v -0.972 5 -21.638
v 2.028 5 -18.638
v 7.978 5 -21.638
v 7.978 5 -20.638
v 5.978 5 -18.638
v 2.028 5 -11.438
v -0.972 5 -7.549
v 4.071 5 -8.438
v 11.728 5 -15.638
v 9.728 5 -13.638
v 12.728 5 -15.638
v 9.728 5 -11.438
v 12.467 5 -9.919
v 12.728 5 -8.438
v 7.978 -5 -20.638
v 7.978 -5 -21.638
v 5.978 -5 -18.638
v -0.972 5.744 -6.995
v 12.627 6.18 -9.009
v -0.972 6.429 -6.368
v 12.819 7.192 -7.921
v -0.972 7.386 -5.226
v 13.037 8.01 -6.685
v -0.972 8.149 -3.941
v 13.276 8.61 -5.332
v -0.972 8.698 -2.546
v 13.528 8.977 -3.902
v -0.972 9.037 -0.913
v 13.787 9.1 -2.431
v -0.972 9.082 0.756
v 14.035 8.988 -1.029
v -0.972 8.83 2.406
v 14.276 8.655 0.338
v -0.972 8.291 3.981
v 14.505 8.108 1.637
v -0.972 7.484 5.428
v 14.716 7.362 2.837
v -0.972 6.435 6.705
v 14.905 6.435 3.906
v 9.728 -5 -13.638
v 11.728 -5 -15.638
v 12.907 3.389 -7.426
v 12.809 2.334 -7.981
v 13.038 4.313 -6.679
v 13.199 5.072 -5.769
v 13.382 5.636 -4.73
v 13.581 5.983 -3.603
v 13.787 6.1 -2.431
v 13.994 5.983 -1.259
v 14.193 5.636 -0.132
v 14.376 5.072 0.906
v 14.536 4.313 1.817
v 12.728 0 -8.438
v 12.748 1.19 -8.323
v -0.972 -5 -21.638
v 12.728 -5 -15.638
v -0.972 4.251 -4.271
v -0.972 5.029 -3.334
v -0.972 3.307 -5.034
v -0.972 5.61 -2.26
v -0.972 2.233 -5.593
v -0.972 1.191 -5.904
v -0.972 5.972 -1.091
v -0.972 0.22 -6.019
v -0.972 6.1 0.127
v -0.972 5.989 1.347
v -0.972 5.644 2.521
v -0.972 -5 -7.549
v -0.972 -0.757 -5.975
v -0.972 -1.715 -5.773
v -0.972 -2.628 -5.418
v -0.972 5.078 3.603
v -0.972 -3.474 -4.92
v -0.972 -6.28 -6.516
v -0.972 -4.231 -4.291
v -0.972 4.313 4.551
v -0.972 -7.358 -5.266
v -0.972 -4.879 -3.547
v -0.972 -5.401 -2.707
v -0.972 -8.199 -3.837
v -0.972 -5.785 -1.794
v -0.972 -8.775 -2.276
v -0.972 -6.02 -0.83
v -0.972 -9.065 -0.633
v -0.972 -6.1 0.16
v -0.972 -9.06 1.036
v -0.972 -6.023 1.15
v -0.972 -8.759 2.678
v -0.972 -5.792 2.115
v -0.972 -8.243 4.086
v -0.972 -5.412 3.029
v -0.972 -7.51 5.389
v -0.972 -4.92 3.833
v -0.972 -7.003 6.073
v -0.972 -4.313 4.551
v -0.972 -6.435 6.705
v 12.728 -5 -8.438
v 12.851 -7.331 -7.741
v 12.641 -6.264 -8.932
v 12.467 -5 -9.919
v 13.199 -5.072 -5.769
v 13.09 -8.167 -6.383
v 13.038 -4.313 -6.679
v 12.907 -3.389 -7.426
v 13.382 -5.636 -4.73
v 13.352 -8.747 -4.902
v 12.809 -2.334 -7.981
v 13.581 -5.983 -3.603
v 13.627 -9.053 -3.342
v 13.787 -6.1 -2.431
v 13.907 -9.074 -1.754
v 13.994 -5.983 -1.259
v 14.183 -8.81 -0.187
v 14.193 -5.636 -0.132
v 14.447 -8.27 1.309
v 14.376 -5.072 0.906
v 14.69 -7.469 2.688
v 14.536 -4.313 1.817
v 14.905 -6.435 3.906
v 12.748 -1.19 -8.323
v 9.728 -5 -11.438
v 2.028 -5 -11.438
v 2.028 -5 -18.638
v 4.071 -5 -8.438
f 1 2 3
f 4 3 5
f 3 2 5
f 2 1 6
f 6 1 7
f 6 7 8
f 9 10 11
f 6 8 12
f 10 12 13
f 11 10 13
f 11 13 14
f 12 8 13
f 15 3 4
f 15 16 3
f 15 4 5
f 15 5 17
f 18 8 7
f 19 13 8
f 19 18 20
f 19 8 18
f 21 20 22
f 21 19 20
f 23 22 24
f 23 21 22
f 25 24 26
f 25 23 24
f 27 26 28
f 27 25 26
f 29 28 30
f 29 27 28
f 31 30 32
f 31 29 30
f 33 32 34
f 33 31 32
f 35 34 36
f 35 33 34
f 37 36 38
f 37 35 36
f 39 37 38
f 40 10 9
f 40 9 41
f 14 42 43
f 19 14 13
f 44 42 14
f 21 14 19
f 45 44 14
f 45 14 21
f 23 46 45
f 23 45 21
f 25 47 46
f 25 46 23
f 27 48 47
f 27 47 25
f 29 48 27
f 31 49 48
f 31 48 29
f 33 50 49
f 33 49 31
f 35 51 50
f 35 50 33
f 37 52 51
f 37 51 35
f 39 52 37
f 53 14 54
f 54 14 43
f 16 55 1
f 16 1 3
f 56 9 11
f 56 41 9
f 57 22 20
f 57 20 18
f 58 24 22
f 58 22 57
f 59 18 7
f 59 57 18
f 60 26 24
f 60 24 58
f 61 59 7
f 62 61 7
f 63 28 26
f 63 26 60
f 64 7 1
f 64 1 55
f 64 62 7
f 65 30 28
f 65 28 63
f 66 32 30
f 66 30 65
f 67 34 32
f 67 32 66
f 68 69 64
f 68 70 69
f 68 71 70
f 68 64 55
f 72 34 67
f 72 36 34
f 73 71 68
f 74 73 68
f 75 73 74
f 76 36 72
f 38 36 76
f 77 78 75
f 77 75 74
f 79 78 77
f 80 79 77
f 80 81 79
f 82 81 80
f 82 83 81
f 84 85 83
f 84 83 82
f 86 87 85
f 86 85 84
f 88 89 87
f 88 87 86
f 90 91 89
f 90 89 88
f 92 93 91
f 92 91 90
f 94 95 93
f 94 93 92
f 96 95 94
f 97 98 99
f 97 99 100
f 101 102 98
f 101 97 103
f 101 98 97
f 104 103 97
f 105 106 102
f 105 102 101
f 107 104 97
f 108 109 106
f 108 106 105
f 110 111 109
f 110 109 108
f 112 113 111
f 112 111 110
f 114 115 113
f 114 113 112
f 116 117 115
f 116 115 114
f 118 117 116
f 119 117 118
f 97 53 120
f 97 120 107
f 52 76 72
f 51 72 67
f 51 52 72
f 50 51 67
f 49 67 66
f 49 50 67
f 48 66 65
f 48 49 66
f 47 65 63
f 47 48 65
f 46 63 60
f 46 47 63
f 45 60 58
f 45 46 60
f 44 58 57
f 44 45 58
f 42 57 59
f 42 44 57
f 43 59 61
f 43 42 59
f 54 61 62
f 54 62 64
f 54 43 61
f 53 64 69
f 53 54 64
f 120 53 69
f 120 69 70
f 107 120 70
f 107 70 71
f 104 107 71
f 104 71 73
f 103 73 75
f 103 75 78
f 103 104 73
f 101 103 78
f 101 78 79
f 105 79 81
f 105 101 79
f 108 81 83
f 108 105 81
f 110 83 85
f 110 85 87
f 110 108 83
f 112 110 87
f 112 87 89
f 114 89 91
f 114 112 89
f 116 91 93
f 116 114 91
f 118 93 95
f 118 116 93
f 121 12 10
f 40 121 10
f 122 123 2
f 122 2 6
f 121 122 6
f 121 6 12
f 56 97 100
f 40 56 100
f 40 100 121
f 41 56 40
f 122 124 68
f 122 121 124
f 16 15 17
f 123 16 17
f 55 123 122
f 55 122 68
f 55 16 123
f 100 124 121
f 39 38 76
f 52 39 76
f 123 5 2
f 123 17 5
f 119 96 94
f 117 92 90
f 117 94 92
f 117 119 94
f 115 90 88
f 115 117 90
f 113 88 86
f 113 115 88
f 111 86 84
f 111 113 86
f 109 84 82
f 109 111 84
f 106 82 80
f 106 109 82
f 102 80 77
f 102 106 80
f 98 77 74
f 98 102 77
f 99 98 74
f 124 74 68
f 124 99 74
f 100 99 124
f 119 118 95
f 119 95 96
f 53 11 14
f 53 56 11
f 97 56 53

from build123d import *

# Parameters (mm, degrees)
F3_DEPTH  = 14
F5_DEPTH  = 5
F6_SIZE   = 2
F7_DEPTH  = 25
F9_DEPTH  = 51.6
F10_DEPTH = 1.1


# Not quite as in the source:
# - a feature names something its author has since deleted; it is built from what else it names


with BuildPart() as f3:
    # F2 (on line) → F3 (new body)
    with BuildSketch(Plane(origin=(0, 0, 0), x_dir=(0, 1, 0), z_dir=(0.984807753, 0, -0.1736481777))):
        with BuildLine():
            ThreePointArc((4.3133513652, 4.3133513652), (5.6356651483, 2.3343689374), (6.1, 0))
            ThreePointArc((6.1, 0), (-2.3343689374, -5.6356651483), (-4.3133513652, 4.3133513652))
            Line((-4.3133513652, 4.3133513652), (-6.4346717088, 6.4346717088))
            ThreePointArc((-6.4346717088, 6.4346717088), (-3.4824192345, -8.4073037459), (9.1, 0))
            ThreePointArc((9.1, 0), (8.4073037459, 3.4824192345), (6.4346717088, 6.4346717088))
            Line((6.4346717088, 6.4346717088), (4.3133513652, 4.3133513652))
        make_face()
    extrude(amount=F3_DEPTH)

    # F4 (on Front) → F5 (join, symmetric)
    with BuildSketch(Plane.XZ):
        Polygon((-0.9719453416, -8.4384017807), (-0.9719453416, -21.6384017807), (7.9780546584, -21.6384017807), (7.9780546584, -18.6384017807), (2.0280546584, -18.6384017807), (2.0280546584, -11.4384017807), (9.7280546584, -11.4384017807), (9.7280546584, -15.6384017807), (12.7280546584, -15.6384017807), (12.7280546584, -11.4438512443), (12.7280546584, -8.4384017807), align=None)
    extrude(amount=F5_DEPTH, both=True)

    # F6
    f6_edges = [f3.edges().sort_by_distance(p)[0] for p in [
        (9.728055, 0, -15.638402),
        (7.978055, 0, -18.638402),
    ]]
    chamfer(f6_edges, length=F6_SIZE)

    # F7 (add): a face of the model
    f7_faces = [f3.faces().sort_by_distance(p)[0] for p in [
        (-1.1008050308, 0, -6.2429755581),
    ]]
    extrude(f7_faces, amount=F7_DEPTH)

    # F8 (on face) → F9 (cut)
    with BuildSketch(Plane(origin=(-0.9719453416, 0, 0), x_dir=(0, -1, 0), z_dir=(-1, 0, 0))):
        with BuildLine():
            Line((22.6868242025, -11.5467039868), (22.6868242025, 11.5467039868))
            Line((22.6868242025, 11.5467039868), (-22.6868242025, 11.5467039868))
            Line((-22.6868242025, 11.5467039868), (-22.6868242025, -11.5467039868))
            Line((-22.6868242025, -11.5467039868), (-5, -11.5467039868))
            Line((-5, -11.5467039868), (-5, -8.4384017807))
            Line((-5, -8.4384017807), (-3.3040728779, -8.4384017807))
            add(Edge.make_bspline(
                [(-3.3040728779, -8.4384017807), (0, -9.7457887872), (3.3040728779, -8.4384017807)],
                knots=[2.7700160081, 2.7700160081, 2.7700160081, 3.5131692991, 3.5131692991, 3.5131692991], degree=2, weights=[1, 0.9317560477, 1]))
            Line((3.3040728779, -8.4384017807), (5, -8.4384017807))
            Line((5, -8.4384017807), (5, -11.5467039868))
            Line((5, -11.5467039868), (22.6868242025, -11.5467039868))
        make_face()
    extrude(amount=F9_DEPTH, mode=Mode.SUBTRACT)

    # F10 (add): faces of the model
    f10_faces = [f3.faces().sort_by_distance(p)[0] for p in [
        (0.6395749646, -4.4604313904, -8.4384017807),
        (0.6395749646, 4.4604313904, -8.4384017807),
    ]]
    extrude(f10_faces, amount=F10_DEPTH)


solid = f3.part
